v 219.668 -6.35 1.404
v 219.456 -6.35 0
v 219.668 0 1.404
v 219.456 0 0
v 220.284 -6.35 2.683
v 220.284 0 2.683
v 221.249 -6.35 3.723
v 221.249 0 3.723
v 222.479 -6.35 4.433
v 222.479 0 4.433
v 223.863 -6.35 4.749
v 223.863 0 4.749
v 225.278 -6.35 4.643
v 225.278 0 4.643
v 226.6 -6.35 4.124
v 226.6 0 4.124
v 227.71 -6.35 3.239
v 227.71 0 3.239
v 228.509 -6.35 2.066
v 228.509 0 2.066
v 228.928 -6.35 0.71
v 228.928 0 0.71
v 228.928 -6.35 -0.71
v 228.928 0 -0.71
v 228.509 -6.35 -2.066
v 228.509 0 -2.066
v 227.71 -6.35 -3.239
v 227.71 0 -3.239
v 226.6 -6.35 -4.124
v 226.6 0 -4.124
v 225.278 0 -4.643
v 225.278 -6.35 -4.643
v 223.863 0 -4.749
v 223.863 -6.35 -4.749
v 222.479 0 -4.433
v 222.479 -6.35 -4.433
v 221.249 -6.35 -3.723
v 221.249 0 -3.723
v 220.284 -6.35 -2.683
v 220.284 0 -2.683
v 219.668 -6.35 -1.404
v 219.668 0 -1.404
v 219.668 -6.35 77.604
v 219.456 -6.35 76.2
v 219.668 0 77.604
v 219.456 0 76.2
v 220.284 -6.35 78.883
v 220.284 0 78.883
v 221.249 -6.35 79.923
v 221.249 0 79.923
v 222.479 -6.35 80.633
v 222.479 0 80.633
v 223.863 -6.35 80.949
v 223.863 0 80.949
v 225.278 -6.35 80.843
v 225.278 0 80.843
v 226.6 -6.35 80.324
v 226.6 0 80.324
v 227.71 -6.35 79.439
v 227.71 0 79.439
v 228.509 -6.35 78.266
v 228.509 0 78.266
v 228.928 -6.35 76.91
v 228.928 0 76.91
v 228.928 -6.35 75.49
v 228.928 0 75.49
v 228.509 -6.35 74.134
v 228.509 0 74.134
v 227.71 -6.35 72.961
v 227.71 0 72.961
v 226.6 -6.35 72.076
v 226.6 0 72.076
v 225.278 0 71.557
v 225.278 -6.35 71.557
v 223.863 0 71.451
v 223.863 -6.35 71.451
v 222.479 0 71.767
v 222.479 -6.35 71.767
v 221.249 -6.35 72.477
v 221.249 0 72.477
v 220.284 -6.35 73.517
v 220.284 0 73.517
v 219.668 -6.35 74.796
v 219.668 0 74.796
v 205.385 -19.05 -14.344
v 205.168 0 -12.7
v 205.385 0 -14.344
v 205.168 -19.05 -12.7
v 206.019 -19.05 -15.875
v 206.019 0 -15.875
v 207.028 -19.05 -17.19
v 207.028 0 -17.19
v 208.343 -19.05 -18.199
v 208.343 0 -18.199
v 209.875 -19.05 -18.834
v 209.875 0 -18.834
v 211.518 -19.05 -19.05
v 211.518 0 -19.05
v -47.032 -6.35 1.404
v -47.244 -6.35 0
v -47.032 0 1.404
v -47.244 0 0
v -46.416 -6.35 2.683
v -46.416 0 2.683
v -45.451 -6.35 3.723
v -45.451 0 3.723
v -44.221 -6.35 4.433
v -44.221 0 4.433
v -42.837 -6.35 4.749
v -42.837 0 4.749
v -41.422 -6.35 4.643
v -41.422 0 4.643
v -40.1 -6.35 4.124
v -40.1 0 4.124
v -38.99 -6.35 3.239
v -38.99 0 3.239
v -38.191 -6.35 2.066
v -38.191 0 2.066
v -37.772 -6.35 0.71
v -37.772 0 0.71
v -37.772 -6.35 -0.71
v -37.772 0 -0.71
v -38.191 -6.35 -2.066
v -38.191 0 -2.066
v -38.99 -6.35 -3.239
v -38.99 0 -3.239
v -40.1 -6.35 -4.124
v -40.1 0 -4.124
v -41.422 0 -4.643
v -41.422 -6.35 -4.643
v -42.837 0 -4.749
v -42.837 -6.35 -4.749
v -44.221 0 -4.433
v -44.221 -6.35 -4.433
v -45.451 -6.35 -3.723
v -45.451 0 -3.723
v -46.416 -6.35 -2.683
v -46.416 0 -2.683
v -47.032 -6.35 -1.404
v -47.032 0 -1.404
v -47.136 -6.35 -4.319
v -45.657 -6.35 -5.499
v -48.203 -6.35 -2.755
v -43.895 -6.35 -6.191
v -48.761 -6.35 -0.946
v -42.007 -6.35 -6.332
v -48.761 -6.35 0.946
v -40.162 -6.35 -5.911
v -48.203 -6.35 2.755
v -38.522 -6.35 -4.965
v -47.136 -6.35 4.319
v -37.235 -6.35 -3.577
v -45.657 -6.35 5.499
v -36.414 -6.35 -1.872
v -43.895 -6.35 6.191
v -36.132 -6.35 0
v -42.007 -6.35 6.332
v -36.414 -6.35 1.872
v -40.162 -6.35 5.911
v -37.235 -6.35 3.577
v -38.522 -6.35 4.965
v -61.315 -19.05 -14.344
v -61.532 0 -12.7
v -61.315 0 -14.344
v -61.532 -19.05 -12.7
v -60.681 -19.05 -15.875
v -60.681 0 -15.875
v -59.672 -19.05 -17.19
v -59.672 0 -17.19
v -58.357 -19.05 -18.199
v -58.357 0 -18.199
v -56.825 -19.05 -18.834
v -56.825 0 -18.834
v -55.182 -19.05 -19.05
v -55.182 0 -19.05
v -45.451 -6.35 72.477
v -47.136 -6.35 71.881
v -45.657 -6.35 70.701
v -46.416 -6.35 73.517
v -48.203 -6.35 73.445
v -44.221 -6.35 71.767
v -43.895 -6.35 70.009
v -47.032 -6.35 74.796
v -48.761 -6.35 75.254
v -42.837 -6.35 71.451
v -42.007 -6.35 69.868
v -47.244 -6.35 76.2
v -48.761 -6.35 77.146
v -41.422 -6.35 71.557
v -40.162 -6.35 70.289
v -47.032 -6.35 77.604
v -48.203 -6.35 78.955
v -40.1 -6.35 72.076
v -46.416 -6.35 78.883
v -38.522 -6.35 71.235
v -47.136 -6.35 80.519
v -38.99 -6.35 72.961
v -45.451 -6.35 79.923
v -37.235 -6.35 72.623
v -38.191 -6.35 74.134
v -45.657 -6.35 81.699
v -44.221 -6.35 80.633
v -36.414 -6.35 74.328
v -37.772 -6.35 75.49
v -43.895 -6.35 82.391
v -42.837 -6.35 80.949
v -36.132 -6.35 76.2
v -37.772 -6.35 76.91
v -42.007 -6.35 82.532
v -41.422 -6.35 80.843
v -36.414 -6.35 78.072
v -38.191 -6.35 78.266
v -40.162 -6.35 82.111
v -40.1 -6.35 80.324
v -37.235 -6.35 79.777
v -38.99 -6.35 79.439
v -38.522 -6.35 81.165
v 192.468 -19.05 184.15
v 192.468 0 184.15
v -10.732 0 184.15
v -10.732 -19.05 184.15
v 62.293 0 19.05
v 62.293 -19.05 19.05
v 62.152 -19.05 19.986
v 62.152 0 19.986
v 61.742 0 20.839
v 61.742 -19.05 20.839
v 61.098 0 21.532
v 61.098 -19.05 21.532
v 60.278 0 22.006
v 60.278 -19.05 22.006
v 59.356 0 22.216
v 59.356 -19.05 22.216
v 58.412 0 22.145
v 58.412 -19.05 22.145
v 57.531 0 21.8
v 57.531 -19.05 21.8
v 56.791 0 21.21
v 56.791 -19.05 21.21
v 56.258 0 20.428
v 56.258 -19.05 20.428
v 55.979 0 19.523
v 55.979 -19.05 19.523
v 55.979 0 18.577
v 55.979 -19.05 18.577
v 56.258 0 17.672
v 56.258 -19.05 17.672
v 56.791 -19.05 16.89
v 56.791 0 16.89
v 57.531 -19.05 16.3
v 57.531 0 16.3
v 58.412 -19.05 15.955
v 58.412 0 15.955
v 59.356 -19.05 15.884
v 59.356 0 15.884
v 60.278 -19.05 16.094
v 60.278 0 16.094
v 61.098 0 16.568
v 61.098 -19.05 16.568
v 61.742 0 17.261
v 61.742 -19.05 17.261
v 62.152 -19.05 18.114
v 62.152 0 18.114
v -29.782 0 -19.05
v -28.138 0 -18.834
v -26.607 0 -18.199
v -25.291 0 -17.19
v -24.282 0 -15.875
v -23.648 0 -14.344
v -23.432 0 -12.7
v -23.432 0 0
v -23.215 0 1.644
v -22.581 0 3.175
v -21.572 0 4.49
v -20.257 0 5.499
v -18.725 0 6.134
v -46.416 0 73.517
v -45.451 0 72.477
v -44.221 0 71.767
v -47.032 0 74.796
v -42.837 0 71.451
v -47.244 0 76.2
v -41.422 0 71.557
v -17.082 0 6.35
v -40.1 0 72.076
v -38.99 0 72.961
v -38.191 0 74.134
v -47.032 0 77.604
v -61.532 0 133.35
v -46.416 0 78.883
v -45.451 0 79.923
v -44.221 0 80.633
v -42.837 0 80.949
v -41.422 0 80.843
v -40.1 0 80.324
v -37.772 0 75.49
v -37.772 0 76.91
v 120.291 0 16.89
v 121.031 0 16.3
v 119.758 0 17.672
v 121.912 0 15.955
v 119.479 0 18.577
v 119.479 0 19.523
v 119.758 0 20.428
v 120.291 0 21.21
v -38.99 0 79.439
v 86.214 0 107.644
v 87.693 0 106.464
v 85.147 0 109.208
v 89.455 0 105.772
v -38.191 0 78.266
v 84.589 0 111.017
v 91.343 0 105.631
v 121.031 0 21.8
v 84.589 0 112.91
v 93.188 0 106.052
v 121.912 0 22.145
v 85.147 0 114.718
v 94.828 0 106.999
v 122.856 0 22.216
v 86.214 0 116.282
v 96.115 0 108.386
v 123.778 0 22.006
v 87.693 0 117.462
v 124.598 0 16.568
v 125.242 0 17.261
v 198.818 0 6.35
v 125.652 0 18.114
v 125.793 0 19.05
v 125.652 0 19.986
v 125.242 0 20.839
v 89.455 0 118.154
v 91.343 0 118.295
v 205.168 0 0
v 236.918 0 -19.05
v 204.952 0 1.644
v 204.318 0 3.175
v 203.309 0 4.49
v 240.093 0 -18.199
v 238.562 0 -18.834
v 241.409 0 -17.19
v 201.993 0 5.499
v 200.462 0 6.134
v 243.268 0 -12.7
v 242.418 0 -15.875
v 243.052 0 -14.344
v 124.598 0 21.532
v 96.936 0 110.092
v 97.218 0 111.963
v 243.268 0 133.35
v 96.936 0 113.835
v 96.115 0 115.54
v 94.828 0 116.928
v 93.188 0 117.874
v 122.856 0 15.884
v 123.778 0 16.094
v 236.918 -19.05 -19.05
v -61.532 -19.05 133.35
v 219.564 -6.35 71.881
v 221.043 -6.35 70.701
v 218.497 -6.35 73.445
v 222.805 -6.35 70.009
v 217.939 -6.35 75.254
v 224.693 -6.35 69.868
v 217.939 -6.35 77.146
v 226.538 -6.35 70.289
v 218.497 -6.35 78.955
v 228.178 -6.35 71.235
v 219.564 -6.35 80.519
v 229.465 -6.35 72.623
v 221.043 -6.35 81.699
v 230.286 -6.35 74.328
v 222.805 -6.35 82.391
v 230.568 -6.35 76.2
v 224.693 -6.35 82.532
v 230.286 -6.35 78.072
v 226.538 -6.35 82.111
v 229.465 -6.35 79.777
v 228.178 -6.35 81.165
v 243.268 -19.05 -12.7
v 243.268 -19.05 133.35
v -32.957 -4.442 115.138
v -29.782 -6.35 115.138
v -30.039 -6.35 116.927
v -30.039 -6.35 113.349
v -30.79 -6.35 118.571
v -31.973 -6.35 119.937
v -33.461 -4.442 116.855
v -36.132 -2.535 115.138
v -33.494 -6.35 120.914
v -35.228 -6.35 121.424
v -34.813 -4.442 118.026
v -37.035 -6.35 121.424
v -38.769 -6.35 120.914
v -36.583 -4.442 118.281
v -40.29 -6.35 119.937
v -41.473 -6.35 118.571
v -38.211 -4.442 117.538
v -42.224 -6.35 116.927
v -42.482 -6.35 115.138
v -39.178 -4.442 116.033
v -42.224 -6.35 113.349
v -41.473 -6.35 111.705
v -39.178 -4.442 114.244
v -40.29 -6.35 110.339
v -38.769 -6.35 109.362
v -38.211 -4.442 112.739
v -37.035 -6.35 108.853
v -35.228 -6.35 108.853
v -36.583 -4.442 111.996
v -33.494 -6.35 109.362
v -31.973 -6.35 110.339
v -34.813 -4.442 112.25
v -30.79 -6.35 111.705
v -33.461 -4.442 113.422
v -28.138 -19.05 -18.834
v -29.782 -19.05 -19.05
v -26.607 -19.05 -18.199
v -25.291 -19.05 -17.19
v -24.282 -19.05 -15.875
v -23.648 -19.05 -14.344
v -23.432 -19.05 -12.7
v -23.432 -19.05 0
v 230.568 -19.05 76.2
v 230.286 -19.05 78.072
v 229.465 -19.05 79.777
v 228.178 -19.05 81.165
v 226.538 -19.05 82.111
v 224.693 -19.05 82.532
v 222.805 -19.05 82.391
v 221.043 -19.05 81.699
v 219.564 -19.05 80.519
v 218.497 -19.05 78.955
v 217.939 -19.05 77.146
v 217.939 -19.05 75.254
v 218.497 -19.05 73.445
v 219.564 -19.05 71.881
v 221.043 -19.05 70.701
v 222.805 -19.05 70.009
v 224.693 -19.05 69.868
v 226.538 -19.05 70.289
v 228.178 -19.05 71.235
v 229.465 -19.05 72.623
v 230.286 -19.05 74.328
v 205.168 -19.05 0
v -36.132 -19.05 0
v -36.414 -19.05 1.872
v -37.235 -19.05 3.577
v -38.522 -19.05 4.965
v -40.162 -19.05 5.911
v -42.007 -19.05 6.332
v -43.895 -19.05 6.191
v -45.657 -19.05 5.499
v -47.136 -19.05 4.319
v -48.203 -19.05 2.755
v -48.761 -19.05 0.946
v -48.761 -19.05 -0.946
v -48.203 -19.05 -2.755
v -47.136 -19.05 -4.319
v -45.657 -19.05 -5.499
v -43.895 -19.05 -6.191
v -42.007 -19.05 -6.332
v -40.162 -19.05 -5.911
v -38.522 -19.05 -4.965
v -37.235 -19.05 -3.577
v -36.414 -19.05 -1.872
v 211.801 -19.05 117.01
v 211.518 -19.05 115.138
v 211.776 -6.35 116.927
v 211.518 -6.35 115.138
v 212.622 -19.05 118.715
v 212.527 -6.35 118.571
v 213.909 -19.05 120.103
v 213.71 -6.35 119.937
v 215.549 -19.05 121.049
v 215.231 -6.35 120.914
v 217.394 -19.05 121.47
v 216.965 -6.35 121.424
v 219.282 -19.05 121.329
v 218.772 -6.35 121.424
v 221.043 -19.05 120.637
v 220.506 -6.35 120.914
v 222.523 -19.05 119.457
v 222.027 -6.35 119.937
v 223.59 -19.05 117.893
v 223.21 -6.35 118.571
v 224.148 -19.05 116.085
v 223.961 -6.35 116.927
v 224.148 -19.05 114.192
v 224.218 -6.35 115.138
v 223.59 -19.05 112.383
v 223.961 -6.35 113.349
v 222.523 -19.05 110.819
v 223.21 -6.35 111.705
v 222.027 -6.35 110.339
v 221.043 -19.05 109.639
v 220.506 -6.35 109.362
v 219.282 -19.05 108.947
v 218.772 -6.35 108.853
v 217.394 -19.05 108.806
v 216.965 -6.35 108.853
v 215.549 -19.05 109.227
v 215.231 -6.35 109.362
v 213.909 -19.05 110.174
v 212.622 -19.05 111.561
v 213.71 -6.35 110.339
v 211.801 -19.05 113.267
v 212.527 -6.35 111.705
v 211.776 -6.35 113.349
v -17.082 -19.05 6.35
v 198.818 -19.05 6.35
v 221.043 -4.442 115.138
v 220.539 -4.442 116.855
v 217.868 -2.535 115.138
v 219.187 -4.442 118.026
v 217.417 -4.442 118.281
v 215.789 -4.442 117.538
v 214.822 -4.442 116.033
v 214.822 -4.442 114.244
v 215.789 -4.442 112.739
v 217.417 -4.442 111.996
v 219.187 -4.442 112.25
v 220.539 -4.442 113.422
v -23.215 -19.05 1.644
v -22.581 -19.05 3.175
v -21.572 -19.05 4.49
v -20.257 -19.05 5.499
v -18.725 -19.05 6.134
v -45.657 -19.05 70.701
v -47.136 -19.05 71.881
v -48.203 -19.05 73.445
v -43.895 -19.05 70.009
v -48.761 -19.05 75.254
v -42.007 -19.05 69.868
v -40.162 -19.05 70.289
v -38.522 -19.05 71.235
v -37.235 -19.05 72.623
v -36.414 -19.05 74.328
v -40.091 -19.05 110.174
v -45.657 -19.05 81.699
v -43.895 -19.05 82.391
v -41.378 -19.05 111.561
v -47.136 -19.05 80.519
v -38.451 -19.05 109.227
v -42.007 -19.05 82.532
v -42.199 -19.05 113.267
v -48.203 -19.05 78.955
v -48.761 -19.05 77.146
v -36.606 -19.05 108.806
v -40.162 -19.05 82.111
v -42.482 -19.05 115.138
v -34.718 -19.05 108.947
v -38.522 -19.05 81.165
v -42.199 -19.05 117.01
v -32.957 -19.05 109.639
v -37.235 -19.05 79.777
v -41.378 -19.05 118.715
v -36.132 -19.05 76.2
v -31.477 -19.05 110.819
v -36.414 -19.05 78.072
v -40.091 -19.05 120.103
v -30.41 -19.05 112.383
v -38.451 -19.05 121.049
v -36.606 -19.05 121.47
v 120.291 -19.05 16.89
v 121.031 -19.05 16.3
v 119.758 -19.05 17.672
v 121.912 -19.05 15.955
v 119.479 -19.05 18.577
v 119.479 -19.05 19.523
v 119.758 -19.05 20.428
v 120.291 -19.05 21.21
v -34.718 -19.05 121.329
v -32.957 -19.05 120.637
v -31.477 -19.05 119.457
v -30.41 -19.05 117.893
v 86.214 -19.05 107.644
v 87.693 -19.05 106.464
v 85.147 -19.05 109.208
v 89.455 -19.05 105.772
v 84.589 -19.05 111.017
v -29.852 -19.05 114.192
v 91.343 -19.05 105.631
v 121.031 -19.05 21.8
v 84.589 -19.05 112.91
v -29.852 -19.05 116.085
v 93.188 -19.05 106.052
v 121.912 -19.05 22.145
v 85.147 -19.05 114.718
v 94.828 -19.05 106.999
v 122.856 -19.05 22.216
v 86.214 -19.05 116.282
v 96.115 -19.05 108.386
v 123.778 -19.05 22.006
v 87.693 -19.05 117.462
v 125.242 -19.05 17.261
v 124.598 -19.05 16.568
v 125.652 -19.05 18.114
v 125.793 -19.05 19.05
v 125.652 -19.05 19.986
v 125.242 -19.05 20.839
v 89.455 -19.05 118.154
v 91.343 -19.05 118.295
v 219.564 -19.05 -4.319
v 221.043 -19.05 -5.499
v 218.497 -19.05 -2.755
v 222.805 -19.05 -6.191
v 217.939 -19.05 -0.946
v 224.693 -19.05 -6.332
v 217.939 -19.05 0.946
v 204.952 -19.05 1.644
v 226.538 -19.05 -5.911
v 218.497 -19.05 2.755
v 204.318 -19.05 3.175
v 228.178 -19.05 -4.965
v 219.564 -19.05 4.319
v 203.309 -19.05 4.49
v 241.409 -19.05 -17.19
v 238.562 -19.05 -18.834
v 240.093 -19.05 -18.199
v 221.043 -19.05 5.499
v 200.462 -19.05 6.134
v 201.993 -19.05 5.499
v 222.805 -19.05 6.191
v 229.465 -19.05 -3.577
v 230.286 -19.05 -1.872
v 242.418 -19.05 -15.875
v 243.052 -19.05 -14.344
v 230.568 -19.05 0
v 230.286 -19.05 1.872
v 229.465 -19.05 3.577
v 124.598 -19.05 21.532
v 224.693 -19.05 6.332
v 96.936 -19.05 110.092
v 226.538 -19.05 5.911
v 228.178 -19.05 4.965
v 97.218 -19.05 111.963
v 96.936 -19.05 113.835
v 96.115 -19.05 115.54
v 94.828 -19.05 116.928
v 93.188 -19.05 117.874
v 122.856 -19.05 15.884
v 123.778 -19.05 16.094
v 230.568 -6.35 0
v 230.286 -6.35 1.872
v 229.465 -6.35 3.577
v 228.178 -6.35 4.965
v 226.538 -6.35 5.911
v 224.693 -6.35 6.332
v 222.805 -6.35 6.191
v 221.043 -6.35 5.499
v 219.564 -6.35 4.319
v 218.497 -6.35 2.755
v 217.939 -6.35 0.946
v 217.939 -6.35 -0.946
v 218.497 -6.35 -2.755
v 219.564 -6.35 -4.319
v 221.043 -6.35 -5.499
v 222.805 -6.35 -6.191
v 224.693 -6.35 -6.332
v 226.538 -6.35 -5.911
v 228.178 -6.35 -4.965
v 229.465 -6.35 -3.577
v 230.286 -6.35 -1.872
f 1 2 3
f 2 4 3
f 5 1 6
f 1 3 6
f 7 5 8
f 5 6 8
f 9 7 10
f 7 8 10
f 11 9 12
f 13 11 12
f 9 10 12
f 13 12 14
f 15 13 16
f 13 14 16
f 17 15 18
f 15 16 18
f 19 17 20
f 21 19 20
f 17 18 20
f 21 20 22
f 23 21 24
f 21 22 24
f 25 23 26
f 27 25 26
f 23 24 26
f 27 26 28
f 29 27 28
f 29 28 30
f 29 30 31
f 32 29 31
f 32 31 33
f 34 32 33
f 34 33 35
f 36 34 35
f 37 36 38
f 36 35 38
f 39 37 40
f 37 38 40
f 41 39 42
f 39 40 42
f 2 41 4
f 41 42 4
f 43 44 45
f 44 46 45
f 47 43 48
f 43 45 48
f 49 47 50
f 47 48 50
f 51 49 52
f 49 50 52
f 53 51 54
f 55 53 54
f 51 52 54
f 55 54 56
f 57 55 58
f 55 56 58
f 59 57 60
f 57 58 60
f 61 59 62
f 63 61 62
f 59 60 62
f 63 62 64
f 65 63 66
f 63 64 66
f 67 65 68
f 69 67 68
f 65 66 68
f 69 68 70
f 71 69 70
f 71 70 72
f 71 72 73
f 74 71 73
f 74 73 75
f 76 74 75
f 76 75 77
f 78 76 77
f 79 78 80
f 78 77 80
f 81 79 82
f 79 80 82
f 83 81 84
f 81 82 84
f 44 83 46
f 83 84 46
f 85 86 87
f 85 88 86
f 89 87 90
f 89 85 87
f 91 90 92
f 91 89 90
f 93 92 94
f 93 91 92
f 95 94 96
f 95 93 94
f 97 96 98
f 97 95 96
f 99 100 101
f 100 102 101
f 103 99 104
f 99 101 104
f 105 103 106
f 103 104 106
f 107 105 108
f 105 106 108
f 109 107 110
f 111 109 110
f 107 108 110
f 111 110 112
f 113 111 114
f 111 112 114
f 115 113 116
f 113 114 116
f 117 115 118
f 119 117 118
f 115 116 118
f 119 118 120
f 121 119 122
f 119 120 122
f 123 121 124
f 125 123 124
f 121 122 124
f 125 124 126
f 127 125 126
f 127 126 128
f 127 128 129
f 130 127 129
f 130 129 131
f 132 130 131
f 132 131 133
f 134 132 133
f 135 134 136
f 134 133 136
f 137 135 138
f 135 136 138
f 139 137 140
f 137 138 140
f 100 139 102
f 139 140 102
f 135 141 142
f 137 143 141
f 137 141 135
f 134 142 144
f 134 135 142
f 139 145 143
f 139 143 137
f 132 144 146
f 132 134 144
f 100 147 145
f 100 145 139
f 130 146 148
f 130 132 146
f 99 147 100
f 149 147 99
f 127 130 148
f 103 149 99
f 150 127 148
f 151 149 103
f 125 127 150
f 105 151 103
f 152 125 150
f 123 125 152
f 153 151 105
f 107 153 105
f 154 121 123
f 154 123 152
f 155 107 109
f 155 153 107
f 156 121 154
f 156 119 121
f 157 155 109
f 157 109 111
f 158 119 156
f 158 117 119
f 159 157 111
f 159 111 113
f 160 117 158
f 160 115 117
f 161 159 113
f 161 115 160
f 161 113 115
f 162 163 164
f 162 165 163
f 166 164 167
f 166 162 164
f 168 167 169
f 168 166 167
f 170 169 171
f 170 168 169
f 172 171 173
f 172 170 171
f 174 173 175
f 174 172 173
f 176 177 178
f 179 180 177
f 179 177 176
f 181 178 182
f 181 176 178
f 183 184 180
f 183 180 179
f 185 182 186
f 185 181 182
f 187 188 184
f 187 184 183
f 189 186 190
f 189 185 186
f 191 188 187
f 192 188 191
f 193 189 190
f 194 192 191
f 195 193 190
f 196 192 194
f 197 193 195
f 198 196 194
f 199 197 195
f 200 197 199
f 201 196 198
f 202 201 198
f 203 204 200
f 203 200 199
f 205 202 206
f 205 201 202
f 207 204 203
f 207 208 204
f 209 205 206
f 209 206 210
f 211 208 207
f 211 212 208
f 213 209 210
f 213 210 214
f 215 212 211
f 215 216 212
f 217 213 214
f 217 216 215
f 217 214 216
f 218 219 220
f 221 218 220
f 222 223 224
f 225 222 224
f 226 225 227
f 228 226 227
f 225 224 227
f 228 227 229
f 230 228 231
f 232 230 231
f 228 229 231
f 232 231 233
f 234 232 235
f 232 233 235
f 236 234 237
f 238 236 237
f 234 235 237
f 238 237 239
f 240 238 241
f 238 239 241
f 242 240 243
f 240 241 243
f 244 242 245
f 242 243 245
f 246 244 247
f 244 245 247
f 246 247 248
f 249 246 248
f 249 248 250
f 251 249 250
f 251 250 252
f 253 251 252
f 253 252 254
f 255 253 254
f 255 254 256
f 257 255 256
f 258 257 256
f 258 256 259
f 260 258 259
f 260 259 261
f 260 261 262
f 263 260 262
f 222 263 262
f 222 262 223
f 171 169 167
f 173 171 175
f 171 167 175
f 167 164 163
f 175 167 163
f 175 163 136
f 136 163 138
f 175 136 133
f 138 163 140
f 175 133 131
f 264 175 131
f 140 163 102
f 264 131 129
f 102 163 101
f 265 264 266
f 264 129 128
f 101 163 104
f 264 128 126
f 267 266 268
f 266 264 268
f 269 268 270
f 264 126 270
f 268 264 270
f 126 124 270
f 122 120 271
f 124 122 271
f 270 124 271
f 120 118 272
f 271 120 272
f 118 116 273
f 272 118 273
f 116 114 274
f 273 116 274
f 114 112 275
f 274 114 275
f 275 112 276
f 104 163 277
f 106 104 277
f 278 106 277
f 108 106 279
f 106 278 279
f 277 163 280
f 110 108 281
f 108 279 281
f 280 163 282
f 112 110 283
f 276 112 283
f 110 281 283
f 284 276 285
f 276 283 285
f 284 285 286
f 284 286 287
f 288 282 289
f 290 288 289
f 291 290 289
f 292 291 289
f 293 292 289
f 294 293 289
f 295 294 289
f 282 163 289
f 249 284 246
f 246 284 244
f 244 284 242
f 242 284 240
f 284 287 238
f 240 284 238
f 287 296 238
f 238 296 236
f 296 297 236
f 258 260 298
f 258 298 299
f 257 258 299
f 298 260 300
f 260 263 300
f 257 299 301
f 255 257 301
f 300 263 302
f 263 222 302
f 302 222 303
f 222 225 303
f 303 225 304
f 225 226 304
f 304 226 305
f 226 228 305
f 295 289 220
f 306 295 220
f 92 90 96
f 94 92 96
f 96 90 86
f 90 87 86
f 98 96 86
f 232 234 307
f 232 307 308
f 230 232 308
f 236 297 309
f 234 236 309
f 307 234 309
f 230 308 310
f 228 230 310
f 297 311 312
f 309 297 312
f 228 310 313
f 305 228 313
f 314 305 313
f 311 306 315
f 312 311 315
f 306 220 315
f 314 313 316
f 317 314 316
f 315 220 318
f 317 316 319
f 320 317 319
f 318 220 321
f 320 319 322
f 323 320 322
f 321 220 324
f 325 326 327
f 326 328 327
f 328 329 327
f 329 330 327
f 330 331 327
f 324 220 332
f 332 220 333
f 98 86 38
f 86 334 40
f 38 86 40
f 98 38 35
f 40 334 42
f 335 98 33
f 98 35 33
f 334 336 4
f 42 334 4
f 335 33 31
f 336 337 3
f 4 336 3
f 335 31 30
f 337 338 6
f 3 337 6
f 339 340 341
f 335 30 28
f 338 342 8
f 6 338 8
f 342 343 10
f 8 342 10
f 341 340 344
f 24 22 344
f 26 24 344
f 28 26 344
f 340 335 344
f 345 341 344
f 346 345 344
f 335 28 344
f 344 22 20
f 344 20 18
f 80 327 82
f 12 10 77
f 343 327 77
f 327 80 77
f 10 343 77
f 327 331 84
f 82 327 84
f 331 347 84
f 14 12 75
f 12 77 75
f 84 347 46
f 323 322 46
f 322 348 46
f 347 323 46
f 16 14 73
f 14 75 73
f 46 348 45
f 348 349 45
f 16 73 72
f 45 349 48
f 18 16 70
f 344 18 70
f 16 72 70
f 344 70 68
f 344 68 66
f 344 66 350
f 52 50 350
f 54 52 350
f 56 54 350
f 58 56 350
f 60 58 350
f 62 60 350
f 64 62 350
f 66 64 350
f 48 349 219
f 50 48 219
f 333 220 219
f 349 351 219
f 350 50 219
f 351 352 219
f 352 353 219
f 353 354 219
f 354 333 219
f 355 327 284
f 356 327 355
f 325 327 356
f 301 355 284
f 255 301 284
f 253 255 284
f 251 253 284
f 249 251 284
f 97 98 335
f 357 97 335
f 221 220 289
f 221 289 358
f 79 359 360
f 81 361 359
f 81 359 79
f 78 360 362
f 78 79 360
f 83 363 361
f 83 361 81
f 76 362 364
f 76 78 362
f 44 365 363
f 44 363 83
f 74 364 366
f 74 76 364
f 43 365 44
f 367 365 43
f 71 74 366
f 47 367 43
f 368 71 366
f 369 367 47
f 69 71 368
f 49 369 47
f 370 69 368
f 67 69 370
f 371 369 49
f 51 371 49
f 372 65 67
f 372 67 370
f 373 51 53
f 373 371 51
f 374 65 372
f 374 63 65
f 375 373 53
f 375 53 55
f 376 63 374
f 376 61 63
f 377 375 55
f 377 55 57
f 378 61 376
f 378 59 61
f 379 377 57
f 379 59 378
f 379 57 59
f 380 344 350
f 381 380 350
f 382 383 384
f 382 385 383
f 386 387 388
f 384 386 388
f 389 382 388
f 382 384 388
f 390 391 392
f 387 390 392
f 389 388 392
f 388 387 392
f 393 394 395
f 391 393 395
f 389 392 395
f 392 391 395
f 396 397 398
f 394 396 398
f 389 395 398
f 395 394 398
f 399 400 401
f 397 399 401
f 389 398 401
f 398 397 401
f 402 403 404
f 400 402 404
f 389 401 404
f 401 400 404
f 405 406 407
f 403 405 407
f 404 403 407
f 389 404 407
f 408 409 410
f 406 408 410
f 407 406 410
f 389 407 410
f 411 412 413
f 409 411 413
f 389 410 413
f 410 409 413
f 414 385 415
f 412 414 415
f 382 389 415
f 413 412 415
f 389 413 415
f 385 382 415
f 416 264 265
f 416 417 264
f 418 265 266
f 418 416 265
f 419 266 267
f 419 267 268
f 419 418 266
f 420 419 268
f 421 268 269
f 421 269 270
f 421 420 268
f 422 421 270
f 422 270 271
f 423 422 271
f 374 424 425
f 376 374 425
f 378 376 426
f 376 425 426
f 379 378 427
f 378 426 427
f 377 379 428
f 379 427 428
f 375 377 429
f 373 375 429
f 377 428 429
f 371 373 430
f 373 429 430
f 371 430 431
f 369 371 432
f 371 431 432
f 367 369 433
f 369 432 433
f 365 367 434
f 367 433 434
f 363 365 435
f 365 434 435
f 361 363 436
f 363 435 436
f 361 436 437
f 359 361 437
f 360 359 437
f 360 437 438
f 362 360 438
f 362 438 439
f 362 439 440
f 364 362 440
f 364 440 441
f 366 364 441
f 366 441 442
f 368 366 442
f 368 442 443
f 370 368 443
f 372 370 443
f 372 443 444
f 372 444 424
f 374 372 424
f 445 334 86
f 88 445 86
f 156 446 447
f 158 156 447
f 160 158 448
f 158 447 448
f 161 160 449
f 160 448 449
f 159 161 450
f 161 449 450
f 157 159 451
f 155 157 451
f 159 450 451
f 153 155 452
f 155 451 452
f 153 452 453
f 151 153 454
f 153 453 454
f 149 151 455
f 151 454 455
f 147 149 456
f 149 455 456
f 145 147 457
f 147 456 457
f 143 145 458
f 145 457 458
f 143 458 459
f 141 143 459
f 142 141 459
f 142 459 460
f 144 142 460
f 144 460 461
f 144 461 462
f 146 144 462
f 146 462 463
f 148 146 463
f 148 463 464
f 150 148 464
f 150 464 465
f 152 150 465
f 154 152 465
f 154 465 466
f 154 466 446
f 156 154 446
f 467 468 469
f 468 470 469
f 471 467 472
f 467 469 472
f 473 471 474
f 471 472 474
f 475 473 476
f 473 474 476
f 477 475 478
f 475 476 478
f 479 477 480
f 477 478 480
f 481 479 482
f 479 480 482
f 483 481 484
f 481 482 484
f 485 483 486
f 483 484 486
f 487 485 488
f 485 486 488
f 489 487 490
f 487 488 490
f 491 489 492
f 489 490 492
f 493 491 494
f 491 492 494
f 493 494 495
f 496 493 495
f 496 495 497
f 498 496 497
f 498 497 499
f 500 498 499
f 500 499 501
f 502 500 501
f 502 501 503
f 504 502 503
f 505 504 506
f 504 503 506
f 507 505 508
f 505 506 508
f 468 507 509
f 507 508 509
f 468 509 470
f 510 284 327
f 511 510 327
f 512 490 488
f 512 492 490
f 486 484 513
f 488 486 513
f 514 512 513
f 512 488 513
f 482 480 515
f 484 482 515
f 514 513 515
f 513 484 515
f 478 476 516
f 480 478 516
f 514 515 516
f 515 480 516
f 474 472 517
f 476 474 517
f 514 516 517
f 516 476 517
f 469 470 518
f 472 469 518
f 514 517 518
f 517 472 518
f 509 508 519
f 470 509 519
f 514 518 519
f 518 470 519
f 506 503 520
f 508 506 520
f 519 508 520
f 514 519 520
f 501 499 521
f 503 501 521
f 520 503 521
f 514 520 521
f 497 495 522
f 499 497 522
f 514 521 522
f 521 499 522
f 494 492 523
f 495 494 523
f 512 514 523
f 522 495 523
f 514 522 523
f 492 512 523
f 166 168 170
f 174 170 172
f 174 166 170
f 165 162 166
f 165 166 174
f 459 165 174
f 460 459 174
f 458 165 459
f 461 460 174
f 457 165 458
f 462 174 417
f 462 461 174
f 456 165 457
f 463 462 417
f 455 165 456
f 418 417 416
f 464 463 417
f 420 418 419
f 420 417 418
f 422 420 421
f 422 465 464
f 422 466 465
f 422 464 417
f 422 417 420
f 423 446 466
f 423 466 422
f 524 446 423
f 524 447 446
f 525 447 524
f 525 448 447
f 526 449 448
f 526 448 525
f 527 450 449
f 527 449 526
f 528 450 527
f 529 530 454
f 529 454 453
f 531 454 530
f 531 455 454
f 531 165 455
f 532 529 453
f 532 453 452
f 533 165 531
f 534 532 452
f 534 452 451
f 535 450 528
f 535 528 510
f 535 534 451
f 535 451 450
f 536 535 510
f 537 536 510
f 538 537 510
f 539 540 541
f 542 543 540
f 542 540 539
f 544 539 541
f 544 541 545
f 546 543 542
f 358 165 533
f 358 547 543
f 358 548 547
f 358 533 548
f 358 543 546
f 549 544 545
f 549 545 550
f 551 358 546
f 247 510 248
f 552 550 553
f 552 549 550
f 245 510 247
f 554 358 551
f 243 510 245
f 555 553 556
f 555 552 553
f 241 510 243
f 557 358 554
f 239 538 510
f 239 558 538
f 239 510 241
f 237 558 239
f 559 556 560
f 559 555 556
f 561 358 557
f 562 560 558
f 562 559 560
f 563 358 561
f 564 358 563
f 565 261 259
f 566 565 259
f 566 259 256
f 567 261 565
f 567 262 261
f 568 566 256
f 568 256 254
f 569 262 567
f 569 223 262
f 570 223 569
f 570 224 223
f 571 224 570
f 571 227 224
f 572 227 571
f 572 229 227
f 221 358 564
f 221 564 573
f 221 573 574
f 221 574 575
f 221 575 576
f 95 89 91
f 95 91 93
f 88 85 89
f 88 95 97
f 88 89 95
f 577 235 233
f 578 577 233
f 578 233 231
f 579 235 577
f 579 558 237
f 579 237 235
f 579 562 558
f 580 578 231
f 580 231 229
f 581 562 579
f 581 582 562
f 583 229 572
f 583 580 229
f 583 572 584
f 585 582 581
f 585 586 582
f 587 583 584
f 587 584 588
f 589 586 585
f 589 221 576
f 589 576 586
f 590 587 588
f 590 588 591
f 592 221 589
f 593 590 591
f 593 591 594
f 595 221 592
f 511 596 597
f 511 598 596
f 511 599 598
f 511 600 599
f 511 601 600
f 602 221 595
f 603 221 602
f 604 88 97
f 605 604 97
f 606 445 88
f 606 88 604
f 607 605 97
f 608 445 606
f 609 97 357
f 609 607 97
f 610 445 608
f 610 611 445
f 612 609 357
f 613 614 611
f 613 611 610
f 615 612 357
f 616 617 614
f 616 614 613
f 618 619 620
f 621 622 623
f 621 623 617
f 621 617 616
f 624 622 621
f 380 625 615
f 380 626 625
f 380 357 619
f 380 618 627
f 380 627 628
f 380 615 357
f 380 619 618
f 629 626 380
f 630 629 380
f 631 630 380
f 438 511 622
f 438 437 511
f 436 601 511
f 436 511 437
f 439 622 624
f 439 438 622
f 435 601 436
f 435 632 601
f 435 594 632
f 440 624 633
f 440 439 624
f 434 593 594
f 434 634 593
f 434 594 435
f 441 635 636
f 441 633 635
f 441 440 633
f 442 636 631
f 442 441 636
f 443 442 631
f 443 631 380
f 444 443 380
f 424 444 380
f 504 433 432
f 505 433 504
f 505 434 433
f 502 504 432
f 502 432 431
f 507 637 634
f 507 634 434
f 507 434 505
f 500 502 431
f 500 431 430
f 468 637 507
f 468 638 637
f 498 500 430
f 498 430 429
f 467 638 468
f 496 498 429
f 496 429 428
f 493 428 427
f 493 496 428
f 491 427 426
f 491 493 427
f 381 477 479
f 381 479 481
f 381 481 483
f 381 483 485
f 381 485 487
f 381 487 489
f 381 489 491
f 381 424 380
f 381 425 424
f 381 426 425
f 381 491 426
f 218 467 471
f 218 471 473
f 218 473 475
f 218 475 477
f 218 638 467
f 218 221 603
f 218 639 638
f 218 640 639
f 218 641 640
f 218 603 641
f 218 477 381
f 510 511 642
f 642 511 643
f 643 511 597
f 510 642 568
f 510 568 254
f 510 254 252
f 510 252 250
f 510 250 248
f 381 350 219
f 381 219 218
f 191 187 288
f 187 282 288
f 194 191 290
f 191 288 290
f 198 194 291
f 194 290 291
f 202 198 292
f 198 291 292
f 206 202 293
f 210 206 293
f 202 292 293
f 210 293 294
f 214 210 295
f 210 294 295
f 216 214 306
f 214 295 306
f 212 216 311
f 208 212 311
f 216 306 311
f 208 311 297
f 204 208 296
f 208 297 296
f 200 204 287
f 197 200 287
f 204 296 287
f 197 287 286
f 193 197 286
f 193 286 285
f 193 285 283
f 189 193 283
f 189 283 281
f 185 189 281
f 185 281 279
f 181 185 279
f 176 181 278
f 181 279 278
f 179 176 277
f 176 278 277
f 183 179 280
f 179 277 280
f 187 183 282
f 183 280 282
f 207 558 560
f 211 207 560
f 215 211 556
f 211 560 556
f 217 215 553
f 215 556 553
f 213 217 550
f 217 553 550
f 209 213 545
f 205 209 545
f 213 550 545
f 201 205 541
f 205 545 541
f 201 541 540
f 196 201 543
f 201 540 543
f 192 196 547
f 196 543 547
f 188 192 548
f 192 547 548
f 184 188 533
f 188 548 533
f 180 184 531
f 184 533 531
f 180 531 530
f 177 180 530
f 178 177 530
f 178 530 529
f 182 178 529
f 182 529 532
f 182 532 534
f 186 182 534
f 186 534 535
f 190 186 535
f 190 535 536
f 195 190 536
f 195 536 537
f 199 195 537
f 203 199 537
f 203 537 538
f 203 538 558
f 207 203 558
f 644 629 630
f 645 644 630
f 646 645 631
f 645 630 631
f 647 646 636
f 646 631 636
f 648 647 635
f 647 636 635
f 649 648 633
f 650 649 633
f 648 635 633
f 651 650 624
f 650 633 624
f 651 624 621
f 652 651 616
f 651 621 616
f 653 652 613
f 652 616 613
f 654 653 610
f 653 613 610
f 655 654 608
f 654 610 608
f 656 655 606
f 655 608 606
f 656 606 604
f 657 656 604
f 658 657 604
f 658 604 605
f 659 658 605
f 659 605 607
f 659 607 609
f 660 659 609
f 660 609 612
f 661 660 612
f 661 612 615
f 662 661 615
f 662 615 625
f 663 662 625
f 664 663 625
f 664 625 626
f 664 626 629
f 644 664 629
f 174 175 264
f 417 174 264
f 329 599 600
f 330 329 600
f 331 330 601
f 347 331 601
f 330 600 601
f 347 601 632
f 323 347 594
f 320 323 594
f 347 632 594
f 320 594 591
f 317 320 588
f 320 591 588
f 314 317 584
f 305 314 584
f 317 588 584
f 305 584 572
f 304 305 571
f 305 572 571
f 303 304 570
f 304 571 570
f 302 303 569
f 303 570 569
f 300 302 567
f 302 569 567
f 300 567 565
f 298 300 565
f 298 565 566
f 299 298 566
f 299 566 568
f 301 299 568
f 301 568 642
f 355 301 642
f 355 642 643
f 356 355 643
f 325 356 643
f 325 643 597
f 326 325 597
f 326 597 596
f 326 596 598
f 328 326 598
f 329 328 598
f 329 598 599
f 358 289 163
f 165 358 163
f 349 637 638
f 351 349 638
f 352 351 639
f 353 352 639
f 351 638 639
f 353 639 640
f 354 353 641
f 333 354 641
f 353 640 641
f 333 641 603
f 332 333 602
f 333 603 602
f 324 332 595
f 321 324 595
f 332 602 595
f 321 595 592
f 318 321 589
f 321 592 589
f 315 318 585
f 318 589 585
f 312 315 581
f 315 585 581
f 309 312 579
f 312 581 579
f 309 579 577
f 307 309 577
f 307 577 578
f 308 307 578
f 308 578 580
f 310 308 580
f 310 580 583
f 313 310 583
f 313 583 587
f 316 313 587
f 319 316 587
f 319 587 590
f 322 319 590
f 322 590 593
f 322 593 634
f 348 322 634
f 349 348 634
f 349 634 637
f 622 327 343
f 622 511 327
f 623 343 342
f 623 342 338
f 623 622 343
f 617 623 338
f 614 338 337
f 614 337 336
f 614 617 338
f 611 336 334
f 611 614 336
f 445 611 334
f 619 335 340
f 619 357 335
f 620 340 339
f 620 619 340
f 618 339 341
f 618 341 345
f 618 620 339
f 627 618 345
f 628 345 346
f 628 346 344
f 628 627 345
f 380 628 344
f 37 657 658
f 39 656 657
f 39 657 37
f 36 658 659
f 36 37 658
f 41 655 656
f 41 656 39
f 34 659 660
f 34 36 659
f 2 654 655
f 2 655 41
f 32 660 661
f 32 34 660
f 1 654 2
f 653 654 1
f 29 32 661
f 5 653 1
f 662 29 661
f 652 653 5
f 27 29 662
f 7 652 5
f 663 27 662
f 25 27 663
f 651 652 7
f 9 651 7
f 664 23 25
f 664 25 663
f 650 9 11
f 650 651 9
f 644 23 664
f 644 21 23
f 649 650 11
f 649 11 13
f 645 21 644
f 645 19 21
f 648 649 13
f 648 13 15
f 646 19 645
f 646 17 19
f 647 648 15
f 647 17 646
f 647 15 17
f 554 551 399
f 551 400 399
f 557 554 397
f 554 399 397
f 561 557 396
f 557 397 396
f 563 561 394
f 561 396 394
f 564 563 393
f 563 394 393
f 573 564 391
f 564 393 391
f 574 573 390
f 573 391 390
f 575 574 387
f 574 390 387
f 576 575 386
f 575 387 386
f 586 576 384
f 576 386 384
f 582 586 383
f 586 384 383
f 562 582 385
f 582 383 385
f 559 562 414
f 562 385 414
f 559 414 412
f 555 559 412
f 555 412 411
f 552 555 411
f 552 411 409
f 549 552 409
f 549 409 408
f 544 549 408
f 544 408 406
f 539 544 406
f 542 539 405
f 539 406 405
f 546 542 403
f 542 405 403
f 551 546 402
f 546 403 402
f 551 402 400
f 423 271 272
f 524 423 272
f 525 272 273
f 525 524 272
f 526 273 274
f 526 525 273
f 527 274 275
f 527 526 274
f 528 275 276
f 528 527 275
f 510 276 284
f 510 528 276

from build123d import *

# Parameters (mm, degrees)
F1_DEPTH       = 19.05
F2_R           = 6.35
F3_SIZE2       = 50.8
F3_SIZE        = 50.8
F4_R           = 6.35
F4_R_2         = 3.175
F5_DEPTH       = 25.4
F6_D           = 12.7
F6_DEPTH       = 12.7
F6_TIP         = 3.8154649308
F7_D           = 9.525
F7_DEPTH       = 25.4
F7_CBORE_D     = 12.7
F7_CBORE_DEPTH = 12.7
F7_TIP         = 2.8615986981


with BuildPart() as f1:
    # F0 (on Front) → F1 (new body)
    with BuildSketch(Plane.XZ):
        Polygon((-61.5315027535, 184.1499997646), (-61.5315027535, -19.0500002354), (-23.4315027535, -19.0500002354), (-23.4315027535, 6.3499997646), (205.1684972465, 6.3499997646), (205.1684972465, -19.0500002354), (243.2684972465, -19.0500002354), (243.2684972465, 184.1499997646), align=None)
    extrude(amount=F1_DEPTH)

    # F2
    f2_edges = [f1.edges().sort_by_distance(p)[0] for p in [
        (-23.431503, -9.525, 6.35),
        (-61.531503, -9.525, -19.05),
        (243.268497, -9.525, -19.05),
        (205.168497, -9.525, -19.05),
        (205.168497, -9.525, 6.35),
        (-23.431503, -9.525, -19.05),
    ]]
    fillet(f2_edges, radius=F2_R)

    # F3
    f3_edges = [f1.edges().sort_by_distance(p)[0] for p in [
        (243.268497, -9.525, 184.15),
        (-61.531503, -9.525, 184.15),
    ]]
    chamfer(f3_edges, length=F3_SIZE, length2=F3_SIZE2)

    # F4 (on face) → F5 (cut)
    with BuildSketch(Plane.XZ.offset(19.05)):
        with Locations((90.8684972465, 111.9631997646)):
            Circle(F4_R)
        with Locations((59.1184972465, 19.0499997646)):
            Circle(F4_R_2)
        with Locations((122.6184972465, 19.0499997646)):
            Circle(F4_R_2)
    extrude(amount=-F5_DEPTH, mode=Mode.SUBTRACT)

    # F6
    with Locations(Plane.XZ.offset(19.05)):
        with Locations((-36.1315027535, 115.1381997646), (217.8684972465, 115.1381997646)):
            Hole(F6_D / 2, depth=F6_DEPTH)
            with Locations((0, 0, -(F6_DEPTH + F6_TIP / 2))):  # 118° drill point
                Cone(0, F6_D / 2, F6_TIP, mode=Mode.SUBTRACT)

    # F7
    with Locations(Plane.XZ.offset(19.05)):
        with Locations((-42.4815027535, 76.1999997646), (-42.4815027535, -2.354e-07), (224.2184972465, -2.354e-07), (224.2184972465, 76.1999997646)):
            CounterBoreHole(F7_D / 2, F7_CBORE_D / 2, F7_CBORE_DEPTH, depth=F7_DEPTH)
            with Locations((0, 0, -(F7_DEPTH + F7_TIP / 2))):  # 118° drill point
                Cone(0, F7_D / 2, F7_TIP, mode=Mode.SUBTRACT)


solid = f1.part
